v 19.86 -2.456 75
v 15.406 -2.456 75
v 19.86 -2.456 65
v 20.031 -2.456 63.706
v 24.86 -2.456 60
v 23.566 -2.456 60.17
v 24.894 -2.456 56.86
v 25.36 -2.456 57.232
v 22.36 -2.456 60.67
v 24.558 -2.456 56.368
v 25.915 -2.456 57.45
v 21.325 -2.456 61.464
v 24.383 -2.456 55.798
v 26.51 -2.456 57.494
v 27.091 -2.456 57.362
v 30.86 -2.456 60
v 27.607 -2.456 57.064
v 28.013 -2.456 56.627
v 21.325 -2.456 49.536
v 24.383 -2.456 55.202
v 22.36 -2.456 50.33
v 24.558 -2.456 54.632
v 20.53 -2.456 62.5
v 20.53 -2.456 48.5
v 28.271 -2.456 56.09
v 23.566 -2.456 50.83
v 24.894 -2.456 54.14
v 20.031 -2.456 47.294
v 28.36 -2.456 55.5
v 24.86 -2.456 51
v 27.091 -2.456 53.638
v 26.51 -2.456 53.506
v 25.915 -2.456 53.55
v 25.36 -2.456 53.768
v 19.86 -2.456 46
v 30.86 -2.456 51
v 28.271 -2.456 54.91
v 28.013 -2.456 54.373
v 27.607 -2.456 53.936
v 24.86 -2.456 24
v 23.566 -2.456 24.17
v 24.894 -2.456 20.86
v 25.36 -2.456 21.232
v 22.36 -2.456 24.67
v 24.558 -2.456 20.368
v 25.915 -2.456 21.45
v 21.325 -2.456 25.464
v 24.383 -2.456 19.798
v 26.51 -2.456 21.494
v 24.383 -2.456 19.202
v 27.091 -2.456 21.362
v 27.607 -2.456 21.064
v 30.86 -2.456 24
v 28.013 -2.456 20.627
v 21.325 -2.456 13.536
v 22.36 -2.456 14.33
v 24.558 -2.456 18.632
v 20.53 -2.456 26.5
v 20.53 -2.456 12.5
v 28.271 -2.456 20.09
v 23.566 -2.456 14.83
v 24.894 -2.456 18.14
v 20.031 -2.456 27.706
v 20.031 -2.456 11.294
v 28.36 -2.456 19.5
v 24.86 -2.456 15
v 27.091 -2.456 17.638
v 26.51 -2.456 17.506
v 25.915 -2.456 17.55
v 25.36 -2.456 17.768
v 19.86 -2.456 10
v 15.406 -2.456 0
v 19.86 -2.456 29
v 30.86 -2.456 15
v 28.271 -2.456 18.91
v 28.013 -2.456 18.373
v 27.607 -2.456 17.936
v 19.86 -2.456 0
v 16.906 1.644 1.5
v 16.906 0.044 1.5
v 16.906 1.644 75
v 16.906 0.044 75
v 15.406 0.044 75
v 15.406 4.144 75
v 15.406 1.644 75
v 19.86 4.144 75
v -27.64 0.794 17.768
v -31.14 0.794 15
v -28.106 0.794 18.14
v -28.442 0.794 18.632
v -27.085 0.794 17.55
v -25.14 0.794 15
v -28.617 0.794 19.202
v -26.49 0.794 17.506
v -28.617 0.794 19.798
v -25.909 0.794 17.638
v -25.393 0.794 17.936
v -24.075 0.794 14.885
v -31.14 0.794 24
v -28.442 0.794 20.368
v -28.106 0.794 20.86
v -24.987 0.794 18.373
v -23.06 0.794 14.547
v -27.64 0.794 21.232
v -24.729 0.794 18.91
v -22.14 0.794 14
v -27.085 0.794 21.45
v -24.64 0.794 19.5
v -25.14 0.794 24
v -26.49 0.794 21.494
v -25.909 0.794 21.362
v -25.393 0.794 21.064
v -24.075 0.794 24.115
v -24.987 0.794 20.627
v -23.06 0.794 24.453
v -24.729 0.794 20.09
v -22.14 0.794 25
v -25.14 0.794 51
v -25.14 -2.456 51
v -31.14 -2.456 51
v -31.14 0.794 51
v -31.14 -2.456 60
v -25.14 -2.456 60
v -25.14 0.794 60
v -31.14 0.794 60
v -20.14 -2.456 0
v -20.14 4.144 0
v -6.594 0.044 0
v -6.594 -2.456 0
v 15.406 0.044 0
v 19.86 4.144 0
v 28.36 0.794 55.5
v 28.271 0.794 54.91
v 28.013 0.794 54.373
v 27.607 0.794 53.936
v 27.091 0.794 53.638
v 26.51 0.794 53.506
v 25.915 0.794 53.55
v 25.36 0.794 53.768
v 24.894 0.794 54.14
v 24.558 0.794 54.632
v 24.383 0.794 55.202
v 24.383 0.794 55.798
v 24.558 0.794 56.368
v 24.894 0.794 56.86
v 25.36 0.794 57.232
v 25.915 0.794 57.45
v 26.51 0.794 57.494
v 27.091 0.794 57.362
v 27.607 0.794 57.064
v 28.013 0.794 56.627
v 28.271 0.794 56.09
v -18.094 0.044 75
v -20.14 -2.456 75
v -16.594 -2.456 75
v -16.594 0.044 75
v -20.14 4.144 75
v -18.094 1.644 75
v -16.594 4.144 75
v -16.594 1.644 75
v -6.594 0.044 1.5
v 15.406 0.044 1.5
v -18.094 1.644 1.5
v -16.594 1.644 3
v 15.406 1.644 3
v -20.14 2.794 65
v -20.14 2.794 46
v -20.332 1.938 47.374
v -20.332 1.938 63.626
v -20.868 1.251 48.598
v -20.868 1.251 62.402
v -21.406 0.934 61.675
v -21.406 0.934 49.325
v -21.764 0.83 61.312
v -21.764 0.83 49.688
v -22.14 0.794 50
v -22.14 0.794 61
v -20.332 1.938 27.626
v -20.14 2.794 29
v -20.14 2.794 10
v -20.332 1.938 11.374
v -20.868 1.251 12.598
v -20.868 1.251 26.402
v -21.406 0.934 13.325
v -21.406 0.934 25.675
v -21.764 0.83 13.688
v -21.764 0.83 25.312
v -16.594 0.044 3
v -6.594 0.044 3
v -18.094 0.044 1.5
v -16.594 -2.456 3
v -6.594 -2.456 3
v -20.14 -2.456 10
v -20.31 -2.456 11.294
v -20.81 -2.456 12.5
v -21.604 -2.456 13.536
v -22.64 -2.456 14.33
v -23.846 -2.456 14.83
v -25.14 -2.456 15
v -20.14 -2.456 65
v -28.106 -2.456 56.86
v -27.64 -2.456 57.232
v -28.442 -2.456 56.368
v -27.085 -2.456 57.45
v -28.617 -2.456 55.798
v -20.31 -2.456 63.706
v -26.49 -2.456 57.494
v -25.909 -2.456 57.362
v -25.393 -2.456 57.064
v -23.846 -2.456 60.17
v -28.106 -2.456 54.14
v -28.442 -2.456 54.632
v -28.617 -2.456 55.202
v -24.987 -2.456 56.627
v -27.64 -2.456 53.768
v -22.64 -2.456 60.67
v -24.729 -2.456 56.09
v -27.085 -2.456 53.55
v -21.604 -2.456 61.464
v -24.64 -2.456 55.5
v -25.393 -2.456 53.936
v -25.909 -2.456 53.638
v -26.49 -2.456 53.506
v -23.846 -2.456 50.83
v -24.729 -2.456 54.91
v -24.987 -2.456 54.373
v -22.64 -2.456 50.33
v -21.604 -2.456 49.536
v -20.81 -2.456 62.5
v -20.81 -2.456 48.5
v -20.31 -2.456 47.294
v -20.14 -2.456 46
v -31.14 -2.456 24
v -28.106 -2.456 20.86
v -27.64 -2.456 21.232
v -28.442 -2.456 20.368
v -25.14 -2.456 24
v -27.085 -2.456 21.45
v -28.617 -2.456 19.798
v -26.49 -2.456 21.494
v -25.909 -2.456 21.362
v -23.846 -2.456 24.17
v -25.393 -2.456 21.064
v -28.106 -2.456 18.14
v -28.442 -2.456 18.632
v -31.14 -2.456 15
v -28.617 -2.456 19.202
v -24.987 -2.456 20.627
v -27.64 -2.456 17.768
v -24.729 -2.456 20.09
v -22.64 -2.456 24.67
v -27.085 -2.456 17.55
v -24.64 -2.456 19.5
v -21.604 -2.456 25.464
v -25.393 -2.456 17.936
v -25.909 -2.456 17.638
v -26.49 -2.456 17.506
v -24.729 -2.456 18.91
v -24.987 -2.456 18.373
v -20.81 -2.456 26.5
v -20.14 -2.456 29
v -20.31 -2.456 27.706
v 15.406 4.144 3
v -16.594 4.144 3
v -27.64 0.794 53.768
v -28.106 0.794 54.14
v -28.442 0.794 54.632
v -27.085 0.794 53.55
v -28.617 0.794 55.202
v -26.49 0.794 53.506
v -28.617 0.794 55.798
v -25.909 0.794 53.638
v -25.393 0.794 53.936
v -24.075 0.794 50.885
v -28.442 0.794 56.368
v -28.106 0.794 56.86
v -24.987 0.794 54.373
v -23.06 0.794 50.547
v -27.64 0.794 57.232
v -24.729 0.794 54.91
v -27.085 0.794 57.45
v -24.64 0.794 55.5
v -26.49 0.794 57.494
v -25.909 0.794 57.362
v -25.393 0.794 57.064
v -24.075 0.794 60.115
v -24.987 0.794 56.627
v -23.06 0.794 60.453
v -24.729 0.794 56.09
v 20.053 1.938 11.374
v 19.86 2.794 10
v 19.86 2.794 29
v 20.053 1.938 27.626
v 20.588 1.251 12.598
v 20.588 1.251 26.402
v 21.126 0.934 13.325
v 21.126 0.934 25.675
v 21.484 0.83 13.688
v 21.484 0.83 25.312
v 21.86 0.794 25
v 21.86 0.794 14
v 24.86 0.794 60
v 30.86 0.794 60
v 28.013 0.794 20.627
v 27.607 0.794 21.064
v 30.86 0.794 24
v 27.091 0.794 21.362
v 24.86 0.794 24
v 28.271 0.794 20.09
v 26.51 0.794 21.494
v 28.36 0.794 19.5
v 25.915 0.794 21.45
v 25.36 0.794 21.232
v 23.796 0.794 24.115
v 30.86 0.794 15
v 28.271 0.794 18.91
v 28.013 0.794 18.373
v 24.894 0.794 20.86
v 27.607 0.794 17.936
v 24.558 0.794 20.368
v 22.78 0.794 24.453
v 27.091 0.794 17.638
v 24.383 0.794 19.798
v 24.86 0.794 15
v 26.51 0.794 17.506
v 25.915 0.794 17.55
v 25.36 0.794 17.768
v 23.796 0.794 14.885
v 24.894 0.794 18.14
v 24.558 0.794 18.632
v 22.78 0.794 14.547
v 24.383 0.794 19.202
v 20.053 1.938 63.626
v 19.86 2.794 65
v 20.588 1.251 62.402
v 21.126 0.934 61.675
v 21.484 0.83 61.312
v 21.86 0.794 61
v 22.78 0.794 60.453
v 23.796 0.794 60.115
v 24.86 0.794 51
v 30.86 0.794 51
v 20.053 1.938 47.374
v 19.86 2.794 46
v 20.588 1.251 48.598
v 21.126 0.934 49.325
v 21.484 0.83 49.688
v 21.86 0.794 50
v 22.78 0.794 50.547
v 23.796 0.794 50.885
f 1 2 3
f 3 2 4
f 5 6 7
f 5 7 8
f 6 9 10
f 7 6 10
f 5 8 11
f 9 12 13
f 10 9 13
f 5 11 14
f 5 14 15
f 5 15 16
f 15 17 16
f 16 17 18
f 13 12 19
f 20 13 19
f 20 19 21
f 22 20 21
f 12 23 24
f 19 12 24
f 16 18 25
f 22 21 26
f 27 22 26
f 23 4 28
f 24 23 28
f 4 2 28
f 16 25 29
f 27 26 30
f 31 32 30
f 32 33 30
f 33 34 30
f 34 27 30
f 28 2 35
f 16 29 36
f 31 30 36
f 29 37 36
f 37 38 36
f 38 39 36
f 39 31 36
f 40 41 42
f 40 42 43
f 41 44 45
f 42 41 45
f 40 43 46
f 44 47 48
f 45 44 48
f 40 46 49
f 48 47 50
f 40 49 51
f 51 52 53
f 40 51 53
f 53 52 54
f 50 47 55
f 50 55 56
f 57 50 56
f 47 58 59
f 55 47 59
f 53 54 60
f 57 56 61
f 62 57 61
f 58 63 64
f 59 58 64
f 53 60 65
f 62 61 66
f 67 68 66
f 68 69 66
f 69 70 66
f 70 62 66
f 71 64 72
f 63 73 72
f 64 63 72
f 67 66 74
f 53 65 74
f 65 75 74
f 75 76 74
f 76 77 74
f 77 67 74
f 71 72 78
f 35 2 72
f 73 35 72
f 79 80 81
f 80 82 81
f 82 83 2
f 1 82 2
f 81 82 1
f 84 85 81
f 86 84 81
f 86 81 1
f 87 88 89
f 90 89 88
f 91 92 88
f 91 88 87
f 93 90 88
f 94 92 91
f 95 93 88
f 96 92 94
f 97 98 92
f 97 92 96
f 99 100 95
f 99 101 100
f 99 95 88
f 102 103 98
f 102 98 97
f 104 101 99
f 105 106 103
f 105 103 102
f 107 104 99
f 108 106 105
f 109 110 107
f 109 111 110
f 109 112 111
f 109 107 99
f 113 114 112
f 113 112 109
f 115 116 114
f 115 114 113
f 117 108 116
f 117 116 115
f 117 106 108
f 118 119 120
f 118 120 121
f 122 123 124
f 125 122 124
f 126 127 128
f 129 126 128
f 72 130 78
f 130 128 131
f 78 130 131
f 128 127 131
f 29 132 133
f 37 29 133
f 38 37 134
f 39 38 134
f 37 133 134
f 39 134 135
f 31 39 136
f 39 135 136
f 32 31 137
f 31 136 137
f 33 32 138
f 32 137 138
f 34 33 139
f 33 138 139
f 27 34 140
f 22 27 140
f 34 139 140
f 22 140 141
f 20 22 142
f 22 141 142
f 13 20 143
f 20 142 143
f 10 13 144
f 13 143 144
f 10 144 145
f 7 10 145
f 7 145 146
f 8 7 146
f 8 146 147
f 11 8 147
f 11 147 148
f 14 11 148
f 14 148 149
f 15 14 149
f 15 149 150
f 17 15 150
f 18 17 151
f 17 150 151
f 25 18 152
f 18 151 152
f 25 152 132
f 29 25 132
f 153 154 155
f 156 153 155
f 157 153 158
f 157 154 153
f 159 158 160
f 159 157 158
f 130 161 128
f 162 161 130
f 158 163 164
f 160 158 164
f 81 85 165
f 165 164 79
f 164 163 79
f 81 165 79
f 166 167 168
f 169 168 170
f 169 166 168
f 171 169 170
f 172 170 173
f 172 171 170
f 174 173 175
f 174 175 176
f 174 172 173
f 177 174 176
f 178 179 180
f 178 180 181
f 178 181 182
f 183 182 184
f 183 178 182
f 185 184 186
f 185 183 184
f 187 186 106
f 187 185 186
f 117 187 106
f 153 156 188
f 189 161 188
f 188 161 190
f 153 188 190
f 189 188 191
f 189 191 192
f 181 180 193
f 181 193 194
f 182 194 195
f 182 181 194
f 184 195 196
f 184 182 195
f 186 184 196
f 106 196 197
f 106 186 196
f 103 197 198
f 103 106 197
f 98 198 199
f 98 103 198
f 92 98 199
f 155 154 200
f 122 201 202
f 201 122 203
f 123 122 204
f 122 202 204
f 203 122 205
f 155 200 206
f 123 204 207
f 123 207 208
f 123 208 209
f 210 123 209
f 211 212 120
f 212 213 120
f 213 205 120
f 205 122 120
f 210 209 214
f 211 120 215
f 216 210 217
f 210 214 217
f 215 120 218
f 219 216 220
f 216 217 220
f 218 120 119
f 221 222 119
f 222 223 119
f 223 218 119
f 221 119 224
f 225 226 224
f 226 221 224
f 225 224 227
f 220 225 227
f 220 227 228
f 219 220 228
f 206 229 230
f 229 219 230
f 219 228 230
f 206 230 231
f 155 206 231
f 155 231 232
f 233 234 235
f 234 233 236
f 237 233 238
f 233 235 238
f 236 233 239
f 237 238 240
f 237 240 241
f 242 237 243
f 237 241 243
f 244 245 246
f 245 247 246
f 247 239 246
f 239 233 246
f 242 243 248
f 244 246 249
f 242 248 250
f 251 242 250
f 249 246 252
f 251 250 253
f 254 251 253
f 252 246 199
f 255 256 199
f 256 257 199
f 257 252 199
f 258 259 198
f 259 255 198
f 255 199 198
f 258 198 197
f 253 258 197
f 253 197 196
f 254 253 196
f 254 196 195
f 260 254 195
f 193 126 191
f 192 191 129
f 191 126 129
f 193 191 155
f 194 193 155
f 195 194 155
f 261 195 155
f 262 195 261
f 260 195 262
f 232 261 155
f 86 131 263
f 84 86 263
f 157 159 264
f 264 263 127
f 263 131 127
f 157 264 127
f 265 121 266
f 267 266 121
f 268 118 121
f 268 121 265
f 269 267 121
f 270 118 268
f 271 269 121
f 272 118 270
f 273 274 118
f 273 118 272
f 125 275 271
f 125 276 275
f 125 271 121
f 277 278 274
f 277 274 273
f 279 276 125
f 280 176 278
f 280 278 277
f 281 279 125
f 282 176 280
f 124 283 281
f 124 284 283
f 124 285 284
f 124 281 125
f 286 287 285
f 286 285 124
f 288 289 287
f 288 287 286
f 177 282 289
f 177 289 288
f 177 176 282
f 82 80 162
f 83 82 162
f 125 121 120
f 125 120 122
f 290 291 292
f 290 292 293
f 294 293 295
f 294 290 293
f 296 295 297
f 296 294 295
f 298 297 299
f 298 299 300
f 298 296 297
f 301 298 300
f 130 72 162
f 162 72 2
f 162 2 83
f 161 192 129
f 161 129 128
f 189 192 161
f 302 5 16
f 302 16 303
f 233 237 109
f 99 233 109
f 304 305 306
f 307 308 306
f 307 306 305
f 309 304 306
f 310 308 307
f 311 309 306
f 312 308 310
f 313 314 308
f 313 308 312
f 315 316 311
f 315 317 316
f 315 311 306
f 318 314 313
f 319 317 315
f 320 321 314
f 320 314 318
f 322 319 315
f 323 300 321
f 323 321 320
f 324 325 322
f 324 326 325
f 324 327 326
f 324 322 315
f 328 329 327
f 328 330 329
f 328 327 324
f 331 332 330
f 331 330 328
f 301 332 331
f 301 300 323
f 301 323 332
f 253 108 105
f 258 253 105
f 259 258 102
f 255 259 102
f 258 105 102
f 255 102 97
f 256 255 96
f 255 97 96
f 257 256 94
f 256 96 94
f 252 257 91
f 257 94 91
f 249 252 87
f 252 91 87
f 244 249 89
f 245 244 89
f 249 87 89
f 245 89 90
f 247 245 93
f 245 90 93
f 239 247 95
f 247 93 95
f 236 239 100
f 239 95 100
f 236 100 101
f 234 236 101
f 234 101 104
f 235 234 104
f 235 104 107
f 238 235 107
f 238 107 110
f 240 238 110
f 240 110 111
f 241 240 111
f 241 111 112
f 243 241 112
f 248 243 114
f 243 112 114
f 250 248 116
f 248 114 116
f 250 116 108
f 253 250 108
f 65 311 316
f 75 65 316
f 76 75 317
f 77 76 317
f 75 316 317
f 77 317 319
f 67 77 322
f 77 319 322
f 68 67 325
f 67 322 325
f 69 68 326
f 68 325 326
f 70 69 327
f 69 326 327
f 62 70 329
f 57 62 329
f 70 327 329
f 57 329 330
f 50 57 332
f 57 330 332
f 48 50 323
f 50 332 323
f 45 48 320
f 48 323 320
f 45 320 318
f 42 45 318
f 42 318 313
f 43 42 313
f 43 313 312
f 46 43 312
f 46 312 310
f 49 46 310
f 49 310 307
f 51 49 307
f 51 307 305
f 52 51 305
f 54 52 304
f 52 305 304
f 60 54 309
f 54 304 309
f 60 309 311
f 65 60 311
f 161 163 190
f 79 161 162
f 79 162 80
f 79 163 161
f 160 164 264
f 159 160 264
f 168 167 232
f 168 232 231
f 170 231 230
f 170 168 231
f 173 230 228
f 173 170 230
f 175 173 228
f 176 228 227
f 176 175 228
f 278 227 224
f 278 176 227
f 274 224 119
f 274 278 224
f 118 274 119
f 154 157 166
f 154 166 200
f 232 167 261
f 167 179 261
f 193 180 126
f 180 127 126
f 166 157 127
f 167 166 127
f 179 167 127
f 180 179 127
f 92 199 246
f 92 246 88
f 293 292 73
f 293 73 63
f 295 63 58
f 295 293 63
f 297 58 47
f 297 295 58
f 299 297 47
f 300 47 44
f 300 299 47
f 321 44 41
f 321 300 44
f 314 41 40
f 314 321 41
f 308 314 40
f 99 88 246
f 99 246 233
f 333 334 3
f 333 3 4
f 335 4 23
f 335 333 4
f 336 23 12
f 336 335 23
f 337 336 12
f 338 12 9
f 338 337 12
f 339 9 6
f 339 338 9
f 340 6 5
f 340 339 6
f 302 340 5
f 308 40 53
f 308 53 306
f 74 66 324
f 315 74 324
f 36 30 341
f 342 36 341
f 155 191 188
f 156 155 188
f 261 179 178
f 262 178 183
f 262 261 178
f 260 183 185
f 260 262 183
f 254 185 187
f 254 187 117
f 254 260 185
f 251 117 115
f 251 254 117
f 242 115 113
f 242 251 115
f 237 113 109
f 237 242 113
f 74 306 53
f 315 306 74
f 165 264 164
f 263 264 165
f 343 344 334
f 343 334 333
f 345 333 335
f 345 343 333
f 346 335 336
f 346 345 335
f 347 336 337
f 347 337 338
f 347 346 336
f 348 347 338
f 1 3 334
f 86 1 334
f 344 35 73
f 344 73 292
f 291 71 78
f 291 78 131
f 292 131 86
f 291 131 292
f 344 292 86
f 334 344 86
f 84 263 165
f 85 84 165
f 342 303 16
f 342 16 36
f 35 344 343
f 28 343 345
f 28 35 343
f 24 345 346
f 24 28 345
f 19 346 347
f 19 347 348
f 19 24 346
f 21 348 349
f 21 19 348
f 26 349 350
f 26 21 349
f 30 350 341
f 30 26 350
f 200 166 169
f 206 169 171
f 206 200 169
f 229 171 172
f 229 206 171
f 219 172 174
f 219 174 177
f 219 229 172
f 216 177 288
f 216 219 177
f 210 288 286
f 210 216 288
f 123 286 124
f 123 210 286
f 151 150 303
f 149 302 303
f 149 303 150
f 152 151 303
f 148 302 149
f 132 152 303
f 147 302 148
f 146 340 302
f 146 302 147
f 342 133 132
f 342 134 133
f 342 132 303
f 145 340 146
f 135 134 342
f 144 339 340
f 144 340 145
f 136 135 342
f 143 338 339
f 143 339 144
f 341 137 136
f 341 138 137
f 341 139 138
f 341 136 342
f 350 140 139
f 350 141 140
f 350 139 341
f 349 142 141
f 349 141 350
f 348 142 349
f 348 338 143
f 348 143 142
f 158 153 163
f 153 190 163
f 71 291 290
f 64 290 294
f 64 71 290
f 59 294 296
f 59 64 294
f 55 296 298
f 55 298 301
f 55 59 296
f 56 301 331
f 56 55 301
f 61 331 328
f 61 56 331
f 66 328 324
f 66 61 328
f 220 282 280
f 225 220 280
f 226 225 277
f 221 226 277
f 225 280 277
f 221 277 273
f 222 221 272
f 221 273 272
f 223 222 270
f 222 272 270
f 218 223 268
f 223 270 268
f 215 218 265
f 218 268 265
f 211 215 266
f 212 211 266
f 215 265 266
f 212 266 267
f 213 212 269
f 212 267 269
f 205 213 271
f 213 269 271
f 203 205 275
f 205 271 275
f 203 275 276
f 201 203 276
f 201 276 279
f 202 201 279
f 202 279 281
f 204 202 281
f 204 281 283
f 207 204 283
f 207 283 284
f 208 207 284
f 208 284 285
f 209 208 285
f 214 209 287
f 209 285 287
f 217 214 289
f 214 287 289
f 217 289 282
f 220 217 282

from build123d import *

# Parameters (mm, degrees)
SKETCH2_W           = 40
SKETCH2_H           = 6.6
BOSS_EXTRUDE1_DEPTH = 3
SKETCH3_W           = 35
SKETCH3_H           = 1.6
CUT_EXTRUDE1_DEPTH  = 1.5
BOSS_EXTRUDE2_DEPTH = 72
SKETCH5_W           = 22
SKETCH5_H           = 2.5
CUT_EXTRUDE2_DEPTH  = 4
SKETCH6_W           = 9
SKETCH6_H           = 3.25
BOSS_EXTRUDE3_DEPTH = 11
SKETCH7_W           = 9
SKETCH7_H           = 3.25
BOSS_EXTRUDE4_DEPTH = 11
SKETCH8_R           = 2
CUT_EXTRUDE3_DEPTH  = 3.25
FILLET1_R           = 2
FILLET2_R           = 5
FILLET3_R           = 5
FILLET4_R           = 2
FILLET5_R           = 5
FILLET6_R           = 5
FILLET7_R           = 2
FILLET8_R           = 2
FILLET9_R           = 5
FILLET10_R          = 5
FILLET11_R          = 5
FILLET12_R          = 5


with BuildPart() as part:
    # Sketch2 → Boss-Extrude1 (new body)
    with BuildSketch(Plane.XY):
        with Locations((-0.139783945, 0.84413532)):
            Rectangle(SKETCH2_W, SKETCH2_H)
    extrude(amount=BOSS_EXTRUDE1_DEPTH)

    # Sketch3 → Cut-Extrude1 (cut)
    with BuildSketch(Plane.XY.offset(3)):
        with Locations((-0.593876274, 0.84413532)):
            Rectangle(SKETCH3_W, SKETCH3_H)
    extrude(amount=-CUT_EXTRUDE1_DEPTH, mode=Mode.SUBTRACT)

    # Sketch4 → Boss-Extrude2 (add)
    with BuildSketch(Plane.XY.offset(3)):
        Polygon((-16.593876274, 4.14413532), (-20.139783945, 4.14413532), (-20.139783945, -2.45586468), (-16.593876274, -2.45586468), (-16.593876274, 0.04413532), (-18.093876274, 0.04413532), (-18.093876274, 1.64413532), (-16.593876274, 1.64413532), align=None)
        Polygon((15.406123726, 4.14413532), (15.406123726, 1.64413532), (16.906123726, 1.64413532), (16.906123726, 0.04413532), (15.406123726, 0.04413532), (15.406123726, -2.45586468), (19.860216055, -2.45586468), (19.860216055, 4.14413532), align=None)
    extrude(amount=BOSS_EXTRUDE2_DEPTH)

    # Sketch5 → Cut-Extrude2 (cut)
    with BuildSketch(Plane.XY.offset(3)):
        with Locations((4.406123726, -1.20586468)):
            Rectangle(SKETCH5_W, SKETCH5_H)
    extrude(amount=-CUT_EXTRUDE2_DEPTH, mode=Mode.SUBTRACT)

    # Sketch6 → Boss-Extrude3 (add)
    with BuildSketch(Plane.ZY.offset(20.139783945)):
        with Locations((19.5, -0.83086468)):
            Rectangle(SKETCH6_W, SKETCH6_H)
        with Locations((55.5, -0.83086468)):
            Rectangle(SKETCH6_W, SKETCH6_H)
    extrude(amount=BOSS_EXTRUDE3_DEPTH)

    # Sketch7 → Boss-Extrude4 (add)
    with BuildSketch(Plane(origin=(19.860216055, 0, 0), x_dir=(0, 0, -1), z_dir=(1, 0, 0))):
        with Locations((-55.5, -0.83086468)):
            Rectangle(SKETCH7_W, SKETCH7_H)
        with Locations((-19.5, -0.83086468)):
            Rectangle(SKETCH7_W, SKETCH7_H)
    extrude(amount=BOSS_EXTRUDE4_DEPTH)

    # Sketch8 → Cut-Extrude3 (cut)
    with BuildSketch(Plane(origin=(0, 0.79413532, 0), x_dir=(1, 0, 0), z_dir=(0, 1, 0))):
        with Locations((-26.639783945, -19.5)):
            Circle(SKETCH8_R)
        with Locations((-26.639783945, -55.5)):
            Circle(SKETCH8_R)
        with Locations((26.360216055, -55.5)):
            Circle(SKETCH8_R)
        with Locations((26.360216055, -19.5)):
            Circle(SKETCH8_R)
    extrude(amount=-CUT_EXTRUDE3_DEPTH, mode=Mode.SUBTRACT)

    # Fillet1
    fillet1_edges = [part.edges().sort_by_distance(p)[0] for p in [
        (19.860216055, 0.79413532, 55.5),
    ]]
    fillet(fillet1_edges, radius=FILLET1_R)

    # Fillet2
    fillet2_edges = [part.edges().sort_by_distance(p)[0] for p in [
        (19.860216055, -0.83086468, 51),
    ]]
    fillet(fillet2_edges, radius=FILLET2_R)

    # Fillet3
    fillet3_edges = [part.edges().sort_by_distance(p)[0] for p in [
        (19.860216055, -0.83086468, 60),
    ]]
    fillet(fillet3_edges, radius=FILLET3_R)

    # Fillet4
    fillet4_edges = [part.edges().sort_by_distance(p)[0] for p in [
        (19.860216055, 0.79413532, 19.5),
    ]]
    fillet(fillet4_edges, radius=FILLET4_R)

    # Fillet5
    fillet5_edges = [part.edges().sort_by_distance(p)[0] for p in [
        (19.860216055, -0.83086468, 15),
    ]]
    fillet(fillet5_edges, radius=FILLET5_R)

    # Fillet6
    fillet6_edges = [part.edges().sort_by_distance(p)[0] for p in [
        (19.860216055, -0.83086468, 24),
    ]]
    fillet(fillet6_edges, radius=FILLET6_R)

    # Fillet7
    fillet7_edges = [part.edges().sort_by_distance(p)[0] for p in [
        (-20.139783945, 0.79413532, 55.5),
    ]]
    fillet(fillet7_edges, radius=FILLET7_R)

    # Fillet8
    fillet8_edges = [part.edges().sort_by_distance(p)[0] for p in [
        (-20.139783945, 0.79413532, 19.5),
    ]]
    fillet(fillet8_edges, radius=FILLET8_R)

    # Fillet9
    fillet9_edges = [part.edges().sort_by_distance(p)[0] for p in [
        (-20.139783945, -0.83086468, 15),
    ]]
    fillet(fillet9_edges, radius=FILLET9_R)

    # Fillet10
    fillet10_edges = [part.edges().sort_by_distance(p)[0] for p in [
        (-20.139783945, -0.83086468, 24),
    ]]
    fillet(fillet10_edges, radius=FILLET10_R)

    # Fillet11
    fillet11_edges = [part.edges().sort_by_distance(p)[0] for p in [
        (-20.139783945, -0.83086468, 51),
    ]]
    fillet(fillet11_edges, radius=FILLET11_R)

    # Fillet12
    fillet12_edges = [part.edges().sort_by_distance(p)[0] for p in [
        (-20.139783945, -0.83086468, 60),
    ]]
    fillet(fillet12_edges, radius=FILLET12_R)


solid = part.part
